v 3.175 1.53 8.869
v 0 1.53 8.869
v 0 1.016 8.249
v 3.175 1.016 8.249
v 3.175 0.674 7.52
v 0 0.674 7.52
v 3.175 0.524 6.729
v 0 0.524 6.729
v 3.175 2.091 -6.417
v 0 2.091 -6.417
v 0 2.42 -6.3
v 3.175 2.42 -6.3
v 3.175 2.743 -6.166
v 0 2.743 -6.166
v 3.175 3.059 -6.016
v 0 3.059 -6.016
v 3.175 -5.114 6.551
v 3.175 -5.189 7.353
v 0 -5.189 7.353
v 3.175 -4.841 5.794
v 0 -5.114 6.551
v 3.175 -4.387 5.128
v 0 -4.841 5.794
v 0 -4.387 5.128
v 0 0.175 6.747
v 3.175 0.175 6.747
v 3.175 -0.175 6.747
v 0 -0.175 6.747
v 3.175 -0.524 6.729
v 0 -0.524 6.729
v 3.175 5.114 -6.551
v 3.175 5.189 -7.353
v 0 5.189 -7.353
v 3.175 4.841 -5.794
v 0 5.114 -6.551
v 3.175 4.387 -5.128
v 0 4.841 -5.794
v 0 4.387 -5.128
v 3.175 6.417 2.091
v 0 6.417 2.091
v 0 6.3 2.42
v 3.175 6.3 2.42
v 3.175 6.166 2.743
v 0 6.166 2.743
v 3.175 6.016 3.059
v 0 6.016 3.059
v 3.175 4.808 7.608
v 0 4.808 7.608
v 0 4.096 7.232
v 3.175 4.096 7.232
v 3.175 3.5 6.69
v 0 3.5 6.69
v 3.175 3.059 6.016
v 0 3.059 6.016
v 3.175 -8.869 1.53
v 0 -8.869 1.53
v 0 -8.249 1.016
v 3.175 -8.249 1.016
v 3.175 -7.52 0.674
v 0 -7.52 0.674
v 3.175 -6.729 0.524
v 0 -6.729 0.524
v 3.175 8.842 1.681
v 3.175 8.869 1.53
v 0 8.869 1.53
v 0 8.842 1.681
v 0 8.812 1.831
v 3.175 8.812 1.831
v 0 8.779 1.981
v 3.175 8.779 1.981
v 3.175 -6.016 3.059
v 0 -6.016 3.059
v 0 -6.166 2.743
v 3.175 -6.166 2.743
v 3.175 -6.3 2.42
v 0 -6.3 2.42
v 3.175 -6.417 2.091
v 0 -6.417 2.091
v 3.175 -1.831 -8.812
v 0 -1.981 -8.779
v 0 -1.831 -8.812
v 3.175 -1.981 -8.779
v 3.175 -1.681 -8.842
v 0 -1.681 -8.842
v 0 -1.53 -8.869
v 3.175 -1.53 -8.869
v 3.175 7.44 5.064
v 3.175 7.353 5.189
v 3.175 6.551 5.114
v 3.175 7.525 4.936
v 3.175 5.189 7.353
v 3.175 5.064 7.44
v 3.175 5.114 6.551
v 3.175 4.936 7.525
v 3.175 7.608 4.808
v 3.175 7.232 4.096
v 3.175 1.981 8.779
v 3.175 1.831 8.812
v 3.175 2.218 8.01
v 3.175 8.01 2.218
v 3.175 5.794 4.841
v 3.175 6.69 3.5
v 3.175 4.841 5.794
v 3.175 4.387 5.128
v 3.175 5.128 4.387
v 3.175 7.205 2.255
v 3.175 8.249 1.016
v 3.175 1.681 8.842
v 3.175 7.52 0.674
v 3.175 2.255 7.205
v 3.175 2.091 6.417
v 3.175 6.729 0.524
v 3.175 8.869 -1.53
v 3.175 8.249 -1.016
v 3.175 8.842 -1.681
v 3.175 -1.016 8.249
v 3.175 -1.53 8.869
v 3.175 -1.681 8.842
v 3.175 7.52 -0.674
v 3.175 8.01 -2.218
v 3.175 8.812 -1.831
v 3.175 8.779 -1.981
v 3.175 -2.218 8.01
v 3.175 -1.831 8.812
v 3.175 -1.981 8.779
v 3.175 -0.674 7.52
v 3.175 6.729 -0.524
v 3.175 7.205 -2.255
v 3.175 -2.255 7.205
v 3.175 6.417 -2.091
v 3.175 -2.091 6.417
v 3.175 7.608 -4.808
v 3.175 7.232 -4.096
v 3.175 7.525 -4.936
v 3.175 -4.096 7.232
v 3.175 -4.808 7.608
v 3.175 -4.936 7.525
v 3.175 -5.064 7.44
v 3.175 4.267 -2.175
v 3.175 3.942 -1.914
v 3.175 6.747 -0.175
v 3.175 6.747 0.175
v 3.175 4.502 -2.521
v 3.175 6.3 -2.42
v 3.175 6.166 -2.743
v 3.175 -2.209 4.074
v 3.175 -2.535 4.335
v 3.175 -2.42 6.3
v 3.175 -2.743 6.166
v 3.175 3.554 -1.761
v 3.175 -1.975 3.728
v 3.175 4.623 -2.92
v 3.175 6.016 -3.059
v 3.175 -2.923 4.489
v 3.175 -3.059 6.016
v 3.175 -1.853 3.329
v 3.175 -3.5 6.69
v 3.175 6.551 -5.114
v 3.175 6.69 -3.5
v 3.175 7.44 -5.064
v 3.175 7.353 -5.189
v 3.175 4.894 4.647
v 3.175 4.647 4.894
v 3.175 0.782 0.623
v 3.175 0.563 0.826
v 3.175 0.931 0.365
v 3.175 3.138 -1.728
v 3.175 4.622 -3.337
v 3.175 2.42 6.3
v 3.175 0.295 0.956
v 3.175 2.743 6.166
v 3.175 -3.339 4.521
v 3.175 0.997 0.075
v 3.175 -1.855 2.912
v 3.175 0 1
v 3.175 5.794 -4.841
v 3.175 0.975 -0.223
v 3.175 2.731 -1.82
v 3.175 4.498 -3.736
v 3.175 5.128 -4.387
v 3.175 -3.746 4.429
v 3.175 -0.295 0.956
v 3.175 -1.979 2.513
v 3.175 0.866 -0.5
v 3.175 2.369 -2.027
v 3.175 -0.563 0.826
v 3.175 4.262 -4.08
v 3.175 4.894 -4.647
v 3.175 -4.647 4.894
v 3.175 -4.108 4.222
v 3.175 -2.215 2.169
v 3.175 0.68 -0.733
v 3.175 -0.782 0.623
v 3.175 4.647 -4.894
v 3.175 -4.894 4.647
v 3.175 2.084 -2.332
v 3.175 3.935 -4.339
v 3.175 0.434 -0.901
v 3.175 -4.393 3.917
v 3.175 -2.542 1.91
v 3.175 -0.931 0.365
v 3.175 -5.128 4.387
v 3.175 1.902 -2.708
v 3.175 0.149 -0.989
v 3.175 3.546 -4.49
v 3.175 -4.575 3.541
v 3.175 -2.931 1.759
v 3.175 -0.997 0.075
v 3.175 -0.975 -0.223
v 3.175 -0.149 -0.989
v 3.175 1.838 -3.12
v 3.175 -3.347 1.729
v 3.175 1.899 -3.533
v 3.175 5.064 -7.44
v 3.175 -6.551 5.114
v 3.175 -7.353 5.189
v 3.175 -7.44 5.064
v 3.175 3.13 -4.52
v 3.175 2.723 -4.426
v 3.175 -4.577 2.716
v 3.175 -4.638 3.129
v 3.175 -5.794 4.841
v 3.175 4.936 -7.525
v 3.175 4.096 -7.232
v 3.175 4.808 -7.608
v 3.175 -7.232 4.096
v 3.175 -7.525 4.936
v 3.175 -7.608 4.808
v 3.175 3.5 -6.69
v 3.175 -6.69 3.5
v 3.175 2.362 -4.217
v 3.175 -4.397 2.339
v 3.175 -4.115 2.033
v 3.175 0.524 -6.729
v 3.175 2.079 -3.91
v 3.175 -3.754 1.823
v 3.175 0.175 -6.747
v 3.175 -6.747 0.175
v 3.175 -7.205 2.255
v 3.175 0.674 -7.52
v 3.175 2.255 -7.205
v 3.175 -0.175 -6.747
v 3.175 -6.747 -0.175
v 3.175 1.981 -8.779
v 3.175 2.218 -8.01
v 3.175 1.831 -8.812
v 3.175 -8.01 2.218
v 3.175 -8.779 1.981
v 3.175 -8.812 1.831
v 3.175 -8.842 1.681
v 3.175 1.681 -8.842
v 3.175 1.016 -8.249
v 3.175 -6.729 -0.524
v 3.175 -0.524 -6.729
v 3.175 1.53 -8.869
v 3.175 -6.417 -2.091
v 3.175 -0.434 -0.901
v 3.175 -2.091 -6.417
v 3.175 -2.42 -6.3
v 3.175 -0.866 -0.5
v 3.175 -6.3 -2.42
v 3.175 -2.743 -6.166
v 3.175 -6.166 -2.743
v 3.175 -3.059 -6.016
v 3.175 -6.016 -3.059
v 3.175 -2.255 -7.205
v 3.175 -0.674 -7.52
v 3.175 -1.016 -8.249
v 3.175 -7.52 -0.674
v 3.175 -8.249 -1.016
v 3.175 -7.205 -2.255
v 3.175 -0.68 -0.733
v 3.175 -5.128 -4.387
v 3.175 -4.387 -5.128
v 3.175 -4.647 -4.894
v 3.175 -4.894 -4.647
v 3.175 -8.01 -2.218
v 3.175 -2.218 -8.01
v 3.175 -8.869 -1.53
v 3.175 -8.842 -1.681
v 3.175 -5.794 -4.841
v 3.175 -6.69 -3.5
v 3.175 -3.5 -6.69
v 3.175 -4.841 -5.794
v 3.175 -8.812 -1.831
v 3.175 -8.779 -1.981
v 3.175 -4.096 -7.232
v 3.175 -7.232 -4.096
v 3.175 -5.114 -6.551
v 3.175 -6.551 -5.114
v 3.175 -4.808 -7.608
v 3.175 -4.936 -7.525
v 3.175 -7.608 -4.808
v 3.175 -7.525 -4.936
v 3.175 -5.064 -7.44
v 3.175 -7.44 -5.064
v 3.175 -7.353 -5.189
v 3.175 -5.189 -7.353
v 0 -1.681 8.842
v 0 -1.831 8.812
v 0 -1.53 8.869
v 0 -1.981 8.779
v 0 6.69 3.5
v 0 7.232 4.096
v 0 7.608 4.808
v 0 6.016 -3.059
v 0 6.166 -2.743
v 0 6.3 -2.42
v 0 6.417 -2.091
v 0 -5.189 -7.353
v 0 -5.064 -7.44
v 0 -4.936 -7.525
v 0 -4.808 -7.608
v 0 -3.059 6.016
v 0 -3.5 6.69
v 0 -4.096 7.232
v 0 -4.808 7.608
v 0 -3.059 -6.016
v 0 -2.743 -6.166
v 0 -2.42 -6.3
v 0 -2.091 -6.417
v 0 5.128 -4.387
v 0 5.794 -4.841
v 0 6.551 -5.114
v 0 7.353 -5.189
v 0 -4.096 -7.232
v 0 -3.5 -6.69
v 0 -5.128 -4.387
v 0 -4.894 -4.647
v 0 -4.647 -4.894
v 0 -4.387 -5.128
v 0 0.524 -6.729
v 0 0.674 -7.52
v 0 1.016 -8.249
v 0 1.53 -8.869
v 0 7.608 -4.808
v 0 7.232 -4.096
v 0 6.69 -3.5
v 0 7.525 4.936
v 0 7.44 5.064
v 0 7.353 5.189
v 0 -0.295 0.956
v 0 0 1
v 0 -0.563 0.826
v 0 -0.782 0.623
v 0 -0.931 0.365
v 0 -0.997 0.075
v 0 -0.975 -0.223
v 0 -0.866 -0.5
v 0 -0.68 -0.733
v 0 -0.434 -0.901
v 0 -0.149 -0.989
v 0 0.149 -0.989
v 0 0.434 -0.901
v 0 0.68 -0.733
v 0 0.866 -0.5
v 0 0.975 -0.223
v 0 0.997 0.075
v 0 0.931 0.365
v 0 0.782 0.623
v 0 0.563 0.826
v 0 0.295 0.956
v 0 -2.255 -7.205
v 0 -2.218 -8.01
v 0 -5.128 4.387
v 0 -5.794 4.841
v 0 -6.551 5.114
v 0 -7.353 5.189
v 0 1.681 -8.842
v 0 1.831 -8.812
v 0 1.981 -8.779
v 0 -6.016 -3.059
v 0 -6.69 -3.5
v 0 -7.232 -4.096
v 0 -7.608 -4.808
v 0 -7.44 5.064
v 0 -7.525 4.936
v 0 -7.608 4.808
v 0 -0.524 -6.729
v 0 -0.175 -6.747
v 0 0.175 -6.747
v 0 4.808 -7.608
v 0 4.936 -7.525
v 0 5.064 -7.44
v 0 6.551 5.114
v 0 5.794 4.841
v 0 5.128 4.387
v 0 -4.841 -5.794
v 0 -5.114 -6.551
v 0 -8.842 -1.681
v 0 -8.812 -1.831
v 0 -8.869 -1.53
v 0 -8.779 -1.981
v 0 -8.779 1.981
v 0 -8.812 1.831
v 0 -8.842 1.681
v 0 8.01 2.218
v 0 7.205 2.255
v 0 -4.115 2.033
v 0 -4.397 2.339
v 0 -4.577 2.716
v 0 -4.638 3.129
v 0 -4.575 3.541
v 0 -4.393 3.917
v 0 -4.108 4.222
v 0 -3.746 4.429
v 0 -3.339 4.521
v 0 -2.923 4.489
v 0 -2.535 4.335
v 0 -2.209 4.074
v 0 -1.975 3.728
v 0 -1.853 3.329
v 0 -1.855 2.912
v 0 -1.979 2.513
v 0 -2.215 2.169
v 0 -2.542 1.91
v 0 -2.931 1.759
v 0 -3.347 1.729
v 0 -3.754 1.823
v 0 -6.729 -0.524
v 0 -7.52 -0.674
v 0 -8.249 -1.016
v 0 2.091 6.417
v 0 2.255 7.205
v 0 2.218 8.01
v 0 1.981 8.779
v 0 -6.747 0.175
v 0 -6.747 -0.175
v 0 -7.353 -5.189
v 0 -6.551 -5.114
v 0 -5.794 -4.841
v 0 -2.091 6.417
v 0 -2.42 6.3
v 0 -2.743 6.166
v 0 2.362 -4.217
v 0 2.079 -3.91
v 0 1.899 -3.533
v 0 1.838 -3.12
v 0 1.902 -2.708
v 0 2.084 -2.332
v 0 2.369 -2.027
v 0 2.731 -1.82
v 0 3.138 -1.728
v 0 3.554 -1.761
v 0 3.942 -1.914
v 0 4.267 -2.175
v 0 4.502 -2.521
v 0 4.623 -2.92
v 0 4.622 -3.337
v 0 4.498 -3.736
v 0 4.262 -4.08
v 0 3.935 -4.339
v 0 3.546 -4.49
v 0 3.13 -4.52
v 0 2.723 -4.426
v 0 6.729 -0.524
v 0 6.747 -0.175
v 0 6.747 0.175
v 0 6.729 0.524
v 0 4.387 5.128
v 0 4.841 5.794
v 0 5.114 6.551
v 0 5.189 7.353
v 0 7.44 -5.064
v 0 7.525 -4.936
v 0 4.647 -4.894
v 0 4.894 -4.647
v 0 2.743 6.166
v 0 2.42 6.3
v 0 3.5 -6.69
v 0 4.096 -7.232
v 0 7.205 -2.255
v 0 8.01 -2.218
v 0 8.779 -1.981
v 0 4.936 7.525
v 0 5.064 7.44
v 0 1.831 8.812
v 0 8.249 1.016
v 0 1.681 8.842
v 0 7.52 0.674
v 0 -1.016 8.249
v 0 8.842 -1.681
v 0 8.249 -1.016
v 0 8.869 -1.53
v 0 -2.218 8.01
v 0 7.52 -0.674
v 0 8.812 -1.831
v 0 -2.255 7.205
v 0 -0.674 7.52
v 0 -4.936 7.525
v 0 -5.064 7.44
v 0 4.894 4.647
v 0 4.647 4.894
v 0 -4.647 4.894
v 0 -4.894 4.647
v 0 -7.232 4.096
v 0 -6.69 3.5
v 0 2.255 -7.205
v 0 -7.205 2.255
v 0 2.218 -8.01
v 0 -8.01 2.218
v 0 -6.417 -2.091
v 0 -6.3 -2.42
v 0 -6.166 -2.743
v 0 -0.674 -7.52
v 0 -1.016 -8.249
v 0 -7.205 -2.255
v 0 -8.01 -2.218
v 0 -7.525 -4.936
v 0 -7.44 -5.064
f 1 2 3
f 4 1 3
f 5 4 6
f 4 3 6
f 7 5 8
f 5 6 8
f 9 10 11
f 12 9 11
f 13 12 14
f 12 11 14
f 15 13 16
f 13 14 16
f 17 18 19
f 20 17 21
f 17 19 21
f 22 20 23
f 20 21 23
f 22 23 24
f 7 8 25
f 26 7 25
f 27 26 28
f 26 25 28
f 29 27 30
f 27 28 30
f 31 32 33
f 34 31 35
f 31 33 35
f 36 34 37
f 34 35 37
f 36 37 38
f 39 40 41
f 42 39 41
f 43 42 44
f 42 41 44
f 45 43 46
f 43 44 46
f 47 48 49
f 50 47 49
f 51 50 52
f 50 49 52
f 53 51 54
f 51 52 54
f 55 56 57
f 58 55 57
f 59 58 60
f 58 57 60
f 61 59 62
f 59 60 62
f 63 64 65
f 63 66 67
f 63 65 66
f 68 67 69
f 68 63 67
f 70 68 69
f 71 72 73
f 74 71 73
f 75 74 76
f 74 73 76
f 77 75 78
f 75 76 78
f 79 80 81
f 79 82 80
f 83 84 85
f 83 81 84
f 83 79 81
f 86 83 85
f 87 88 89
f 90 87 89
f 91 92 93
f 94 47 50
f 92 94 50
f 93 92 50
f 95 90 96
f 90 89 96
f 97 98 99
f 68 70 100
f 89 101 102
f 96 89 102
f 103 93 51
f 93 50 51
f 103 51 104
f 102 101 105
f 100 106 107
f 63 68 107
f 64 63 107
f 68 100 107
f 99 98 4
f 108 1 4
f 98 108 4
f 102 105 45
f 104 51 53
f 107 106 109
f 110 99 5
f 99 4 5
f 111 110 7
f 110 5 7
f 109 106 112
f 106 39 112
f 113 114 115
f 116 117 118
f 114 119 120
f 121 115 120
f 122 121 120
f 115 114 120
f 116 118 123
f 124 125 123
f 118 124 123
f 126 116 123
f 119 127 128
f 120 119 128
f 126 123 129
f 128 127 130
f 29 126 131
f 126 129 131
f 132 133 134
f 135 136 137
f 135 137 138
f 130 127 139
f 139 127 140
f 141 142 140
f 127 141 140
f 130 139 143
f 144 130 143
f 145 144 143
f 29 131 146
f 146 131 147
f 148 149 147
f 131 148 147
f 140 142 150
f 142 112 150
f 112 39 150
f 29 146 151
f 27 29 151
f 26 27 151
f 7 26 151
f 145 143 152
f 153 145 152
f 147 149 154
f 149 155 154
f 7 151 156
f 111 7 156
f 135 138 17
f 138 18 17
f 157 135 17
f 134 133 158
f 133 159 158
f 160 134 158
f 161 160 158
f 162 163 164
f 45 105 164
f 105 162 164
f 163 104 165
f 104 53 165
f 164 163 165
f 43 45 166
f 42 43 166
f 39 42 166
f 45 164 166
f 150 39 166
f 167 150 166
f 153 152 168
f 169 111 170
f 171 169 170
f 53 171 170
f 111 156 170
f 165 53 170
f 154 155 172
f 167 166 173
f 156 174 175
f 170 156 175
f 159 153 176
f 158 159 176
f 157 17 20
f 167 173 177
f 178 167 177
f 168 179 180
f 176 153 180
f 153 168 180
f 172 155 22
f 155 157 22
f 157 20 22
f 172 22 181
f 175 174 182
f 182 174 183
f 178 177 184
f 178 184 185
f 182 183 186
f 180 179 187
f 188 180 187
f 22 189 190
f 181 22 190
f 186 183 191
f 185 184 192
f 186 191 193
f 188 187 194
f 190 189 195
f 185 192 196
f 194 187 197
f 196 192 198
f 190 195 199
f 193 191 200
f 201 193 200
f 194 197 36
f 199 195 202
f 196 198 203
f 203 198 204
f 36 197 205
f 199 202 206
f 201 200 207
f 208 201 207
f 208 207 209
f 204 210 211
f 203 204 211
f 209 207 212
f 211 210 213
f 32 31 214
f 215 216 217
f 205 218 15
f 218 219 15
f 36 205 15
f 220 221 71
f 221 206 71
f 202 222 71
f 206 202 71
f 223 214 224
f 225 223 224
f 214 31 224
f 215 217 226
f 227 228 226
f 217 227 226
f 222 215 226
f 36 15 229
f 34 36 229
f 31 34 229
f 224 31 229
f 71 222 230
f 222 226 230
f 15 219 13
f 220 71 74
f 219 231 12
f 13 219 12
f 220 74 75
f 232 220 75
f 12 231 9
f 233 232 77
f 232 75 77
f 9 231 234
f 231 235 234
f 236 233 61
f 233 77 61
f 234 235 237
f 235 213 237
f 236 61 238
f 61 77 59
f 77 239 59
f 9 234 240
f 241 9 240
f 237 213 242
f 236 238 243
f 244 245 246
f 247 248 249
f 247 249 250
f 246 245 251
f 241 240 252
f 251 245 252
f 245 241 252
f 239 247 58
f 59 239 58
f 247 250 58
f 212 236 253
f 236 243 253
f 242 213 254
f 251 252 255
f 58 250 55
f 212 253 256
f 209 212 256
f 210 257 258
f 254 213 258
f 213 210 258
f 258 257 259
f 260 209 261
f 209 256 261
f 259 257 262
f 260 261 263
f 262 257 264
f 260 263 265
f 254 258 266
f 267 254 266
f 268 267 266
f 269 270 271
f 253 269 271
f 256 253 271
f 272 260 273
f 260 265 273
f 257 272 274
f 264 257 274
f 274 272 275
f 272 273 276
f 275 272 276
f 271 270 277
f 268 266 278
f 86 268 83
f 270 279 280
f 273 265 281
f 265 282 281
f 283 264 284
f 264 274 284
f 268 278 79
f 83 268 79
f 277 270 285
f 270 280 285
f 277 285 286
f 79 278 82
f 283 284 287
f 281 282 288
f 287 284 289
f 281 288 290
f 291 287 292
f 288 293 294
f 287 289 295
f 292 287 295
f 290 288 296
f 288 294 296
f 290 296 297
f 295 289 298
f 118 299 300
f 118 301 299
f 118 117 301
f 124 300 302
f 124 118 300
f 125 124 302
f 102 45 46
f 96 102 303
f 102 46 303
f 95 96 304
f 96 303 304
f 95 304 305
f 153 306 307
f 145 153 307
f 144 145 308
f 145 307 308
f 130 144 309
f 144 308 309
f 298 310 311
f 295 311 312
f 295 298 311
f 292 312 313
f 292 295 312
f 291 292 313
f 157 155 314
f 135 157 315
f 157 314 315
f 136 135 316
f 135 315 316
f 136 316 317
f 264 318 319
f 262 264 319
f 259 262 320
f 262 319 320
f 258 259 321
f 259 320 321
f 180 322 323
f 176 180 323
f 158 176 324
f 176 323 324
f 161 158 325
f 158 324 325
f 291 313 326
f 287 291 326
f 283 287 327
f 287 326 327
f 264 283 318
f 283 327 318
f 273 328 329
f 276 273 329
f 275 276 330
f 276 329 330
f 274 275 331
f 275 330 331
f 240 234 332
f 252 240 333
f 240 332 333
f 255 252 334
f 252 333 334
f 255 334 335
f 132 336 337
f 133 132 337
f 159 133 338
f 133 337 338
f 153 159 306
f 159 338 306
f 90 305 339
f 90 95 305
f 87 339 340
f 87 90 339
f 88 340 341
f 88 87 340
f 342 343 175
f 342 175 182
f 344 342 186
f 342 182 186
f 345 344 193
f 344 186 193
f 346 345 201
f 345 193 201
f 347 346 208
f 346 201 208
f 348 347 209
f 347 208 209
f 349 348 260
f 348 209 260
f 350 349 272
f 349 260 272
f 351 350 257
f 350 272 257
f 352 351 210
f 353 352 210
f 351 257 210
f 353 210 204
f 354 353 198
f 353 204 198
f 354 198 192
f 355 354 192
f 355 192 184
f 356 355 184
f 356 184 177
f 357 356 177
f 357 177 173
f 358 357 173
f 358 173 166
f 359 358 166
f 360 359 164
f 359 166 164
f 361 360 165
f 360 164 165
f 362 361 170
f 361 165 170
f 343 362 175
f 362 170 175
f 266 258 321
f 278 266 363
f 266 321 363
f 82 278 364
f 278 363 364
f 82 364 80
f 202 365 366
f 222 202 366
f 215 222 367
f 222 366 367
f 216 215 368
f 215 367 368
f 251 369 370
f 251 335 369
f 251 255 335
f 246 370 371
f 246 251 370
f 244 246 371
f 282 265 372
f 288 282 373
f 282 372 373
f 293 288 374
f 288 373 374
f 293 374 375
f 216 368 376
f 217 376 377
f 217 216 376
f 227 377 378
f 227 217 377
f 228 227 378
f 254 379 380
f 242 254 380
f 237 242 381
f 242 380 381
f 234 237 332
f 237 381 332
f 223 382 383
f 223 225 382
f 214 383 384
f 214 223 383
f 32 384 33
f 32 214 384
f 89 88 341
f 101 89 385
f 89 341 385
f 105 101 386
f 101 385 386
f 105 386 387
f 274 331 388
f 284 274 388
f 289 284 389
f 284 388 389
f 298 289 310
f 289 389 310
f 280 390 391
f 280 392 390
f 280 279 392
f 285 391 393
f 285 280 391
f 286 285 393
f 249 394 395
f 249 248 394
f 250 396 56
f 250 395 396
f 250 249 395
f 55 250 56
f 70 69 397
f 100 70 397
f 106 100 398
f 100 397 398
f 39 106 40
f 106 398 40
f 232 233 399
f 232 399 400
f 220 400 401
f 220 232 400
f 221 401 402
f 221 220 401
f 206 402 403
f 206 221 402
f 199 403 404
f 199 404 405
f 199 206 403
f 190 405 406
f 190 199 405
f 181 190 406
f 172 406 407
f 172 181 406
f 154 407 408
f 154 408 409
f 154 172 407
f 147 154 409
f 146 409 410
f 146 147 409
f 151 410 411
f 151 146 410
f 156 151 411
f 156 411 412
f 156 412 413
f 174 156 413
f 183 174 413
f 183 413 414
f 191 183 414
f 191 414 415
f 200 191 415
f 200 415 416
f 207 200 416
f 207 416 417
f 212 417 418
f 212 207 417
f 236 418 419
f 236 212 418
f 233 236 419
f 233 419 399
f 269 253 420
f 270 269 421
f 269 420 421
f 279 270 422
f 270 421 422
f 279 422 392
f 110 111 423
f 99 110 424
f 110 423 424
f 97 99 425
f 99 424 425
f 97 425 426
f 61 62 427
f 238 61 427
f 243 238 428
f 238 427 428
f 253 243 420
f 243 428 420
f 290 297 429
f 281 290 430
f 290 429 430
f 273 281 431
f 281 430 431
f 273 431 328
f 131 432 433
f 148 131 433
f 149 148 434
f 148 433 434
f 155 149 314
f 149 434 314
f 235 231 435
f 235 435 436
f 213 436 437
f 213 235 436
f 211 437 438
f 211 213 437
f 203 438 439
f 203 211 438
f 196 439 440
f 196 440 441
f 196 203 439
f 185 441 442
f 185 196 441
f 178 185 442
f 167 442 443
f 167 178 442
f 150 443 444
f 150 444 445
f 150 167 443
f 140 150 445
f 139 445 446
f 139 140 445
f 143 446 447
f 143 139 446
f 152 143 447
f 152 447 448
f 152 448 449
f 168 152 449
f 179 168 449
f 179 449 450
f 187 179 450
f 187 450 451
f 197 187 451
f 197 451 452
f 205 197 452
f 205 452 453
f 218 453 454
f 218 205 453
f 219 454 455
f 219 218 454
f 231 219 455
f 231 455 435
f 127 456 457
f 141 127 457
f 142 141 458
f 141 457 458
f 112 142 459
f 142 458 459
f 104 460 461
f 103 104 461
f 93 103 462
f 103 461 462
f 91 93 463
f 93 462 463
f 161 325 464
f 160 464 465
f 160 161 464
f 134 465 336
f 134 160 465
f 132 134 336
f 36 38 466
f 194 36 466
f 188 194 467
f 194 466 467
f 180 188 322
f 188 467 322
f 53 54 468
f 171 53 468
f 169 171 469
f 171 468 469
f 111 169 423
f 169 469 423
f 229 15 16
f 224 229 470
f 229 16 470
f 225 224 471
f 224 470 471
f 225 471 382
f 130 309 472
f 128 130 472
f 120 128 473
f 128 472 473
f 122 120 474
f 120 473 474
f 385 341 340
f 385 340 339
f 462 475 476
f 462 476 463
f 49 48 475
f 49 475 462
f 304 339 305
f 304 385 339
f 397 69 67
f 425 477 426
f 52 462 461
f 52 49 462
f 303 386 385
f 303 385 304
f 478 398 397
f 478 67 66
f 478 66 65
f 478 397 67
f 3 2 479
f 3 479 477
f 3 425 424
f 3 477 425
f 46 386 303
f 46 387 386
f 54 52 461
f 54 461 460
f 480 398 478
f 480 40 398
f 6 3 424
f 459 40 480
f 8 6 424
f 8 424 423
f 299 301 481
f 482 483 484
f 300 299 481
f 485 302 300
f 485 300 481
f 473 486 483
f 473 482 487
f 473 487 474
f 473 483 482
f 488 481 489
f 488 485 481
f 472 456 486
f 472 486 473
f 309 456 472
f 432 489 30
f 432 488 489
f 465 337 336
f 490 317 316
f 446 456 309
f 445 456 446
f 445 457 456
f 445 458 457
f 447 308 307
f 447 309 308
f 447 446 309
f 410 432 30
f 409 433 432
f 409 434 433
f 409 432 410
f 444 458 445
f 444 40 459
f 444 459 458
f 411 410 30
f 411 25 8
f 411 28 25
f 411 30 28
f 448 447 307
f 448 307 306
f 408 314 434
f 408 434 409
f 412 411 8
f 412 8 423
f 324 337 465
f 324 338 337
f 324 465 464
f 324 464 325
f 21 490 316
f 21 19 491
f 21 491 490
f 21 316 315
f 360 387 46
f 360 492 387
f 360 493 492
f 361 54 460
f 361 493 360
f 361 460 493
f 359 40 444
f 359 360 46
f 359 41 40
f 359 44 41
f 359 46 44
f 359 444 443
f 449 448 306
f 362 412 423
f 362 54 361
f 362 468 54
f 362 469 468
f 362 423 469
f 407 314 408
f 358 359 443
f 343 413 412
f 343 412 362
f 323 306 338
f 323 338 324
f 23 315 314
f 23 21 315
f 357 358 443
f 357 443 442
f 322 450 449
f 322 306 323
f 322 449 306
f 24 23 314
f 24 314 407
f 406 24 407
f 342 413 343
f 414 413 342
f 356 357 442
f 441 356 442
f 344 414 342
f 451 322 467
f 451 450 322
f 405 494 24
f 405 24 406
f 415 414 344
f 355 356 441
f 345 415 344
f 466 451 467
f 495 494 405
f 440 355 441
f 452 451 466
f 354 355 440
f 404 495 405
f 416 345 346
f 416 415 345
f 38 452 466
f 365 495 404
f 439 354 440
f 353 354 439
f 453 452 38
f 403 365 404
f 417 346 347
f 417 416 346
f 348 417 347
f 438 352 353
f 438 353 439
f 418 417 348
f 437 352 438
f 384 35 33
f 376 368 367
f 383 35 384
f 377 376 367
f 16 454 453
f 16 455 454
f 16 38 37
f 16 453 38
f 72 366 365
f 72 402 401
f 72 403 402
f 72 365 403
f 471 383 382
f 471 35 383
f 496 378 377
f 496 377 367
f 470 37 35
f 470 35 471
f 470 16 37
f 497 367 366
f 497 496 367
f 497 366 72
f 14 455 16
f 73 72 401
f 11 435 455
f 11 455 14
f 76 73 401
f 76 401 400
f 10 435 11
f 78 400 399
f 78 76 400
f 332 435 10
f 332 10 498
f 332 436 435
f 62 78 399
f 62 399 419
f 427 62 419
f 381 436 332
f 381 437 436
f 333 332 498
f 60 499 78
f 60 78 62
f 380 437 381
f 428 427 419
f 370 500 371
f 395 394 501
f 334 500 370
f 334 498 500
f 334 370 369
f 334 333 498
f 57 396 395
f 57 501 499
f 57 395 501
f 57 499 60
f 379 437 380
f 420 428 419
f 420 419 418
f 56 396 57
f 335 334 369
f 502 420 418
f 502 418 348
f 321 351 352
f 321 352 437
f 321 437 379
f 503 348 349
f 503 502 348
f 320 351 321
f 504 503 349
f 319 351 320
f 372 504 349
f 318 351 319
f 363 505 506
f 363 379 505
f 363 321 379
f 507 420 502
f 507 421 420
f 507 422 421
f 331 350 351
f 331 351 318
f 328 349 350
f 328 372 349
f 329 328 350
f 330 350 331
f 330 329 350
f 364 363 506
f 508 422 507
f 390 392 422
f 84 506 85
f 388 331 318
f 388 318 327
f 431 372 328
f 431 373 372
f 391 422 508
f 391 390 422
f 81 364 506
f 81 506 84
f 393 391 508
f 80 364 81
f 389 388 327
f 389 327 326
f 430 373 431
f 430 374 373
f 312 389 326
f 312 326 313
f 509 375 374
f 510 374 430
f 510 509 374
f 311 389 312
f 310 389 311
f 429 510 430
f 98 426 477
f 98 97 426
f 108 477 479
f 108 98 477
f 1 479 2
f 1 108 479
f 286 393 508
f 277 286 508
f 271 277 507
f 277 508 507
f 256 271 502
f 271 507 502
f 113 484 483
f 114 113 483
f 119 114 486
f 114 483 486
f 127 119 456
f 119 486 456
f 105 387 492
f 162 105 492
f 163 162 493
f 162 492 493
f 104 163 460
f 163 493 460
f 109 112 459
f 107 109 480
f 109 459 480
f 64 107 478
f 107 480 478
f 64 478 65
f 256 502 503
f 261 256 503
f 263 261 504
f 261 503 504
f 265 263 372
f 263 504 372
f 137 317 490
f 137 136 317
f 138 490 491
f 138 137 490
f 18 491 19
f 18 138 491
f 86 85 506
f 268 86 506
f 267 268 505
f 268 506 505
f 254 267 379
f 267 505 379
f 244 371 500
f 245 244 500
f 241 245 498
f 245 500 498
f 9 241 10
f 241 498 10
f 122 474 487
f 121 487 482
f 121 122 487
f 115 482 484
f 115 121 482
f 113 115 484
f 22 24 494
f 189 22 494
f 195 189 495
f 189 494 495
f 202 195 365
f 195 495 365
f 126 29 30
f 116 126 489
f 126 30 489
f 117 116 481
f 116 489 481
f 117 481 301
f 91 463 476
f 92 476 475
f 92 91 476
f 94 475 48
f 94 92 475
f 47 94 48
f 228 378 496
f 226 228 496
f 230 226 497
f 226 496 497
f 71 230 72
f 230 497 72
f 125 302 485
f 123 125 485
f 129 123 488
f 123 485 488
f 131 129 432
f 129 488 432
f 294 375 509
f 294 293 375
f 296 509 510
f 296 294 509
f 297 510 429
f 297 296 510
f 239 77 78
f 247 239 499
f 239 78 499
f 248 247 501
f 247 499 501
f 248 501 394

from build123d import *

# Parameters (mm, degrees)
BASPROSKE_W            = 3.175
BASPROSKE_H            = 9
TOOTHCUT_DEPTH         = 14.117950488
TEETHCUTS_COUNT        = 16
TEETHCUTS_ANGLE        = 337.5
BORSKE_R               = 1
BORE_DEPTH             = 50.0016256
CUT_EXTRUDE2_START     = -3.175
CUT_EXTRUDE2_OUTLINE_R = 1.4
CUT_EXTRUDE2_DEPTH     = 3.175


# Read off the part's stored shape, not the designer's step: Cut-Extrude2
with BuildPart() as part:
    # BasProSke → Base-Revolve (revolve)
    with BuildSketch(Plane(origin=(0, 0, 0), x_dir=(1, 0, 0), z_dir=(0, 1, 0)), mode=Mode.PRIVATE) as base_revolve_sk:
        with Locations((1.5875, 4.5)):
            Rectangle(BASPROSKE_W, BASPROSKE_H)
    revolve(base_revolve_sk.sketch.rotate(Axis((-10, 0, 0), (1, 0, 0)), 180), axis=Axis((-10, 0, 0), (1, 0, 0)))

    # TooCutSke → ToothCut (cut, through all)
    with BuildSketch(Plane(origin=(0, 0, 0), x_dir=(0, 0, -1), z_dir=(1, 0, 0))):
        with BuildLine():
            ThreePointArc((0.523792937, 6.728643397), (0, 6.749), (-0.523792937, 6.728643397))
            ThreePointArc((-0.523792937, 6.728643397), (-0.828704482, 7.90962059), (-1.553355277, 8.890721711))
            ThreePointArc((-1.553355277, 8.890721711), (0, 9.0254), (1.553355277, 8.890721711))
            ThreePointArc((1.553355277, 8.890721711), (0.828704482, 7.90962059), (0.523792937, 6.728643397))
        make_face()
    toothcut = extrude(amount=TOOTHCUT_DEPTH, mode=Mode.SUBTRACT)

    # TeethCuts: ToothCut ×16 about axis
    teethcuts_axis = Axis((-10, 0, 0), (1, 0, 0))
    for i in range(1, TEETHCUTS_COUNT):
        add(toothcut.rotate(teethcuts_axis, i * TEETHCUTS_ANGLE / (TEETHCUTS_COUNT - 1)), mode=Mode.SUBTRACT)

    # BorSke → Bore (cut, symmetric)
    with BuildSketch(Plane(origin=(0, 0, 0), x_dir=(0, 0, -1), z_dir=(1, 0, 0))):
        with Locations(Location((0, 0, 0), (0, 0, 180))):
            Circle(BORSKE_R)
    extrude(amount=BORE_DEPTH, both=True, mode=Mode.SUBTRACT)

    # Cut-Extrude2 outline → Cut-Extrude2 (cut)
    with BuildSketch(Plane(origin=(0, 0.498479729, -127.163742786), x_dir=(0, -0.6257802276580691, -0.779999427353774), z_dir=(-1, 0, 0)).offset(CUT_EXTRUDE2_START)):
        with Locations((-98.465111461, 75.484141115)):
            Circle(CUT_EXTRUDE2_OUTLINE_R)
        with Locations((-99.286304129, 84.446598512)):
            Circle(CUT_EXTRUDE2_OUTLINE_R)
    extrude(amount=CUT_EXTRUDE2_DEPTH, mode=Mode.SUBTRACT)


solid = part.part
